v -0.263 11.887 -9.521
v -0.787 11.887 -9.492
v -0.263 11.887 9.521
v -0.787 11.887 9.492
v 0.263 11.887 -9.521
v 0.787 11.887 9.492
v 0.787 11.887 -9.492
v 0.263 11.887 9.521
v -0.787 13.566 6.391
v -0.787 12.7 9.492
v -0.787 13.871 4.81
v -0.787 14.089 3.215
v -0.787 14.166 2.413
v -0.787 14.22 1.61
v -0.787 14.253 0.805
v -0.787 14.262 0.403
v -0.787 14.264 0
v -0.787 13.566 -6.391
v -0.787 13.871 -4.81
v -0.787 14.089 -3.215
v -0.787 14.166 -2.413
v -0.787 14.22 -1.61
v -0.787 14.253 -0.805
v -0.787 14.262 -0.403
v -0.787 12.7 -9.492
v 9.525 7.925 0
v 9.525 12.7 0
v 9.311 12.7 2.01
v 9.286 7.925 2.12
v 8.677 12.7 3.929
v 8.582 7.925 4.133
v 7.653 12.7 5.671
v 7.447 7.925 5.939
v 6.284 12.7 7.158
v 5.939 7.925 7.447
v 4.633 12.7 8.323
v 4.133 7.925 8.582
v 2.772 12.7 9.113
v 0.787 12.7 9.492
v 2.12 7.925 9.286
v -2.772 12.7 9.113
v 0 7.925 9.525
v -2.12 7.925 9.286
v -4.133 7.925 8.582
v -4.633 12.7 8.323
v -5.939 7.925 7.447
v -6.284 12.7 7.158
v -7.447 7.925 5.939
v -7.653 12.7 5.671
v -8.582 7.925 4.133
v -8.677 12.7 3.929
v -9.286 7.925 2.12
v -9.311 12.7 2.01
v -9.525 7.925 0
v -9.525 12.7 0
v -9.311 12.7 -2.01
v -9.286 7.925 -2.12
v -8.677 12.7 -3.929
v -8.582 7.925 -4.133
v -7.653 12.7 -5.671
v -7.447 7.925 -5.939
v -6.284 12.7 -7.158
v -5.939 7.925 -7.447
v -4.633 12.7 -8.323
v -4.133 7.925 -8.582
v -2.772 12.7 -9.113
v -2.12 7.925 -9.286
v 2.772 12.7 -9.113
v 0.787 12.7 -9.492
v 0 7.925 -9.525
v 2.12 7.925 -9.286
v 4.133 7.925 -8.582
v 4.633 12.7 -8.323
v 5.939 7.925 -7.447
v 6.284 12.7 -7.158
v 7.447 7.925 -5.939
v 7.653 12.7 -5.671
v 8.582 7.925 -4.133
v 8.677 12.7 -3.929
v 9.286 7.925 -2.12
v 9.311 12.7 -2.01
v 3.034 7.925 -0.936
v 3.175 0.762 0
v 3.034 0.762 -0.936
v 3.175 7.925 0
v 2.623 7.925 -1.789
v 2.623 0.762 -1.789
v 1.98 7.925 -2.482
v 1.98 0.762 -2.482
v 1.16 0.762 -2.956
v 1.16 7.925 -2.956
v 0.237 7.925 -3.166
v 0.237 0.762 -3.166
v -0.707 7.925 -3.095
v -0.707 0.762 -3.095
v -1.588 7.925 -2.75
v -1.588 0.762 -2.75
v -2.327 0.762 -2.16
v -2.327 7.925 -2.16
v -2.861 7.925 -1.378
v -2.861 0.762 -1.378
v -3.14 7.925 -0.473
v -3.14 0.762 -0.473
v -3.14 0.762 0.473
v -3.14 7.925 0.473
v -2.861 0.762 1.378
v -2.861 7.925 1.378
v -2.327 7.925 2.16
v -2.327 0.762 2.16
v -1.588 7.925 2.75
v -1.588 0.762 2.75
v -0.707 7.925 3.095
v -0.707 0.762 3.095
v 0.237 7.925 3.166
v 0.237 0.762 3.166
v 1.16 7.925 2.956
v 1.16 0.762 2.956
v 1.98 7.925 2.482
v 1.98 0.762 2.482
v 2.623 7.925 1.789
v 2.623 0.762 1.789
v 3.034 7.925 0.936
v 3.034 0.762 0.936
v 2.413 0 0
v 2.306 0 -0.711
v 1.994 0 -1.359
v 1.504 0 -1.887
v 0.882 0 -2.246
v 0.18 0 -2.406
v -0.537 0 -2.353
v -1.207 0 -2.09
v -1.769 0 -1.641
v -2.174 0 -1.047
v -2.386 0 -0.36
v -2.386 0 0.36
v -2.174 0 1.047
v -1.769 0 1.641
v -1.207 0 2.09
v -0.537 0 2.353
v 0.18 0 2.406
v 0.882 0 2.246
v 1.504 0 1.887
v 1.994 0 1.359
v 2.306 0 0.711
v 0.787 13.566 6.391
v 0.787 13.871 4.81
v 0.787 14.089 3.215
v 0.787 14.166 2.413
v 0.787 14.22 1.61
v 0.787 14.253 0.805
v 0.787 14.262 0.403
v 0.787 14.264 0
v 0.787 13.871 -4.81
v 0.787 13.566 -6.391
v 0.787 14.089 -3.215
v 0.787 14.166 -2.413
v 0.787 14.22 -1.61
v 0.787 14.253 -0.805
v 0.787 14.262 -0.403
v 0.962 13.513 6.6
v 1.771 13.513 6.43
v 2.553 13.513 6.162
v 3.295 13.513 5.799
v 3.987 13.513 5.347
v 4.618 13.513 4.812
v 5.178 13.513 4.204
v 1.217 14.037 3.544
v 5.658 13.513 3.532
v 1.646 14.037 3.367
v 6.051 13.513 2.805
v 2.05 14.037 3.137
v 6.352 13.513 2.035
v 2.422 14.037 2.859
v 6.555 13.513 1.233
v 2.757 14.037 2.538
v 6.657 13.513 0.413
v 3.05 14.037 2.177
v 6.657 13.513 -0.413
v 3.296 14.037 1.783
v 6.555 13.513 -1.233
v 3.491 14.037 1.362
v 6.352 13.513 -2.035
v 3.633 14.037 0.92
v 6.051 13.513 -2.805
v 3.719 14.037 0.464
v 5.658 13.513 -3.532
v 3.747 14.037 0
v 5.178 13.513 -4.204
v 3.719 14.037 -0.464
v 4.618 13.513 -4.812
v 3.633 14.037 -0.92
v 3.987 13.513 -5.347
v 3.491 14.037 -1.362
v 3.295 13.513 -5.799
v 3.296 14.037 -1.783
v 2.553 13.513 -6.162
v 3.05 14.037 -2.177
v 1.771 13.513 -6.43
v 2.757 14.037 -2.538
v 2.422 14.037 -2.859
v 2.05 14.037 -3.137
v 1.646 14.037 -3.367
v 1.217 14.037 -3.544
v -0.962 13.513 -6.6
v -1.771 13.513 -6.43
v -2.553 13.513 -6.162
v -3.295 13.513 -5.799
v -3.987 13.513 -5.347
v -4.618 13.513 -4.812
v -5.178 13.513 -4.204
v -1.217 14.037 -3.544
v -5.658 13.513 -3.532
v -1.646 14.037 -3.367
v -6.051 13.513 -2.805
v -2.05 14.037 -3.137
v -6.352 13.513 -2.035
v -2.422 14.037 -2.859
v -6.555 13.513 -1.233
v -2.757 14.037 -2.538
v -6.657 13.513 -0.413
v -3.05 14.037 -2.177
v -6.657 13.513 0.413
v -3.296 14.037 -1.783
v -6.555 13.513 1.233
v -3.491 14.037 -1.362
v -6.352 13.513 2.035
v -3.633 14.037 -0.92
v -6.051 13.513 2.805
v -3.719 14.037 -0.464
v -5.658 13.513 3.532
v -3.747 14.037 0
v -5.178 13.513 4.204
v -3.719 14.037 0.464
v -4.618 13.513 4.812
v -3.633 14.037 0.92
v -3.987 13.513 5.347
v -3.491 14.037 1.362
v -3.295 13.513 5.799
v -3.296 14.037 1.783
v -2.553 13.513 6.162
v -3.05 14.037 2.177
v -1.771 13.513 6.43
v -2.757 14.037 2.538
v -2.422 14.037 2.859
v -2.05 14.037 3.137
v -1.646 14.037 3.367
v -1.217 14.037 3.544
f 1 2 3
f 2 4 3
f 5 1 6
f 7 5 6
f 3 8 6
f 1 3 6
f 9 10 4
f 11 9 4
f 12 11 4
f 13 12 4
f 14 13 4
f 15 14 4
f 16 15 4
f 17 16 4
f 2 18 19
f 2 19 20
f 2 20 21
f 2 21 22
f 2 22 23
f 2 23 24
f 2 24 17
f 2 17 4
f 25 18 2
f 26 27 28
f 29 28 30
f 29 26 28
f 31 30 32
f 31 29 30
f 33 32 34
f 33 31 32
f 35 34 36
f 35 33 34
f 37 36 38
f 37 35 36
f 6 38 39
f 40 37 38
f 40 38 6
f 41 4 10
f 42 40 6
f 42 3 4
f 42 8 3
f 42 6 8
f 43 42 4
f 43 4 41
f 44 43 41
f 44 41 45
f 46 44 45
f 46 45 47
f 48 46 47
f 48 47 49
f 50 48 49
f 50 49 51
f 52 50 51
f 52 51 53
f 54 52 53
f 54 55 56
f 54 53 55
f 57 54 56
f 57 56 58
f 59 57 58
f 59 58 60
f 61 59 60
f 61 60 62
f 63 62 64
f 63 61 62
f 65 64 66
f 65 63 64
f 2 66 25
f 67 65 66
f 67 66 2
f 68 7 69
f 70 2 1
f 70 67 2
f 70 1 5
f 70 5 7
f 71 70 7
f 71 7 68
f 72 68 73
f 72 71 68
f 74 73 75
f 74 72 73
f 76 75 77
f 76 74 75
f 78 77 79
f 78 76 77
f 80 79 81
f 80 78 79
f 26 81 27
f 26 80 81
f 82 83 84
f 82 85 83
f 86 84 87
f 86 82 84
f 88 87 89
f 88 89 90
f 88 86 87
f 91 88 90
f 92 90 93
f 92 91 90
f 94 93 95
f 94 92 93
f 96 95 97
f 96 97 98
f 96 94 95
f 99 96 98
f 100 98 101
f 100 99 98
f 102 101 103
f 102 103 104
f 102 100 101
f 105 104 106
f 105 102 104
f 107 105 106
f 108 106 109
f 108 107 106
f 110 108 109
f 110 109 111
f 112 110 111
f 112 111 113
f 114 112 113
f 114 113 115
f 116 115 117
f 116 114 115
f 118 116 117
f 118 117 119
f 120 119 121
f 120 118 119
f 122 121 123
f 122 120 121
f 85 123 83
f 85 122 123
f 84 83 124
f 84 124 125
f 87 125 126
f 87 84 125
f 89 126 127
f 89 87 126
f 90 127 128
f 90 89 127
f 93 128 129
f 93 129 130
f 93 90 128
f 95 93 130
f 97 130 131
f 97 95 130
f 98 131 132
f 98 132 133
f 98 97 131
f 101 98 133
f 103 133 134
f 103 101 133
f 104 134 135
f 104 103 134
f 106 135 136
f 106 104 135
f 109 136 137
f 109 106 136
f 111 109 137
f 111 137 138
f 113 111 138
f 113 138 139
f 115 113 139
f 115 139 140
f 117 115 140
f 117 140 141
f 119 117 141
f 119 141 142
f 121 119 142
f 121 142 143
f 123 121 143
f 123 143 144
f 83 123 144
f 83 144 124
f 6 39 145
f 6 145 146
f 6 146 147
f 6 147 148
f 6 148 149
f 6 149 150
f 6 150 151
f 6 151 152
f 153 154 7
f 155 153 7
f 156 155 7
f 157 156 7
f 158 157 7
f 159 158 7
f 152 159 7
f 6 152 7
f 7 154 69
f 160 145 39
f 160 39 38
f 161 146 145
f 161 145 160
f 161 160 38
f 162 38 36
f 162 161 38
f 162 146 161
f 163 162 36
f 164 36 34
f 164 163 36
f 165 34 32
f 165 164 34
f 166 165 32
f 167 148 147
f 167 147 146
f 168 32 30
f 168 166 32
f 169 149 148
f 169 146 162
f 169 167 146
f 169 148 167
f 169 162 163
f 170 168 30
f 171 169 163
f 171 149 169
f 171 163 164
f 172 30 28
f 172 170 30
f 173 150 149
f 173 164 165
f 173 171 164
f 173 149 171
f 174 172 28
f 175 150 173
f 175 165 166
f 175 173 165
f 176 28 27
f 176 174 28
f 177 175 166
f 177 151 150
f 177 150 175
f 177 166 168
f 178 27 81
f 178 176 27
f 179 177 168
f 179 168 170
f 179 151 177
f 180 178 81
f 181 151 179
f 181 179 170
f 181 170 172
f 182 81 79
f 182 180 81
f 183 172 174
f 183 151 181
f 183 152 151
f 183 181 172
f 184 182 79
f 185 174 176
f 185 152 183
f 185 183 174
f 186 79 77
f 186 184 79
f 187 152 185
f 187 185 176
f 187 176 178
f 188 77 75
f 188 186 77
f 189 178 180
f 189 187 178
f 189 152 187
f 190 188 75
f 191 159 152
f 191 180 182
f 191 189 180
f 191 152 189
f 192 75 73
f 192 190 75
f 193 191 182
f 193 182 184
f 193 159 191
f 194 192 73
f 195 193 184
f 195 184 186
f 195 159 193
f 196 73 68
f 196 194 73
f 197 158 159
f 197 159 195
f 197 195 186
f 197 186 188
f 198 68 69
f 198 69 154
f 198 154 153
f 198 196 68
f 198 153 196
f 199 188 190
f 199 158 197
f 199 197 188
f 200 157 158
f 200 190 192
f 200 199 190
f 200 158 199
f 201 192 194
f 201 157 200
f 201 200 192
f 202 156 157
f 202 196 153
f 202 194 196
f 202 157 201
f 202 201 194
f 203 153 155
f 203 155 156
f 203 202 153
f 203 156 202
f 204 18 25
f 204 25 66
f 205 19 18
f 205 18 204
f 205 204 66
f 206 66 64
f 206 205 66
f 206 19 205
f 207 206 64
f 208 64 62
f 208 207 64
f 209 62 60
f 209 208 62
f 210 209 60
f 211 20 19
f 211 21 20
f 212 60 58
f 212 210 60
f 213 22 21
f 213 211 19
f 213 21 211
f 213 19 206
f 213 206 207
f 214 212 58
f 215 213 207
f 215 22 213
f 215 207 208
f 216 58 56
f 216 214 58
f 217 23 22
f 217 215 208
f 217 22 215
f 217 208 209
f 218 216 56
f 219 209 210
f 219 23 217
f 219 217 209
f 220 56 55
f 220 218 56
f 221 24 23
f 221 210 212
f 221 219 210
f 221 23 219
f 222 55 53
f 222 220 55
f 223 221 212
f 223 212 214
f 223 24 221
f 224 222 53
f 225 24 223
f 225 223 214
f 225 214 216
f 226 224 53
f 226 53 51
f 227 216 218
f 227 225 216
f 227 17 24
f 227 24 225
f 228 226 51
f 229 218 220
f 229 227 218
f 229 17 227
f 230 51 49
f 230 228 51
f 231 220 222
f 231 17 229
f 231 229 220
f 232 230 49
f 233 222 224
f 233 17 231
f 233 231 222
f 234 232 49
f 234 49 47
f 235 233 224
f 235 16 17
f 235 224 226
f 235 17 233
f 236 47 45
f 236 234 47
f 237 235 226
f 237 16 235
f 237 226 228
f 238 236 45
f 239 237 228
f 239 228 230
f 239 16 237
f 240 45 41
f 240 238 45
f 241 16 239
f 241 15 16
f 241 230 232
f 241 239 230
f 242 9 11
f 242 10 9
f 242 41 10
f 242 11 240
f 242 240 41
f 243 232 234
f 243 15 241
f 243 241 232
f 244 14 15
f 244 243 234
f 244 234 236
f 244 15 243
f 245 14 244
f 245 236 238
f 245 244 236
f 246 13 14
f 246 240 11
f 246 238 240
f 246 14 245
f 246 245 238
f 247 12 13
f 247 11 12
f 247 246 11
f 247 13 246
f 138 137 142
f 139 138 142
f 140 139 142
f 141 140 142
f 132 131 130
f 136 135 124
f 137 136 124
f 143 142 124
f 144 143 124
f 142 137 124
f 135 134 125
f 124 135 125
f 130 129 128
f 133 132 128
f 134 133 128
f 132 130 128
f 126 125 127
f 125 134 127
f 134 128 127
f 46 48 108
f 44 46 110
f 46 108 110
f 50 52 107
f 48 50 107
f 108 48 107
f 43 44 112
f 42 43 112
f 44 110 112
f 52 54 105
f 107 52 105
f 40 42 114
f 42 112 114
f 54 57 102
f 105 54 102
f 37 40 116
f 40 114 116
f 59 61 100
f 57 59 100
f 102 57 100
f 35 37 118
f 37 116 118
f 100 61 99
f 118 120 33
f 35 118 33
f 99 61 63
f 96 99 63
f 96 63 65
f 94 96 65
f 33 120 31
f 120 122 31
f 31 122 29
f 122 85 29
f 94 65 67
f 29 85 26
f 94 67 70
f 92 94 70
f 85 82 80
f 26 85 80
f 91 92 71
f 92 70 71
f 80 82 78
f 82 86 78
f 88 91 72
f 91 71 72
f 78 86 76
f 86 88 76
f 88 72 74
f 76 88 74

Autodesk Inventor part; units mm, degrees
ref_plane "YZ Plane" through (0, 0, 0) normal (1, 0, 0) x (0, 1, 0)
ref_plane "XZ Plane" through (0, 0, 0) normal (0, 1, 0) x (-1, 0, 0)
sketch "Sketch1" plane through (0, 0, 0) normal (0, 0, 1) x (1, 0, 0)
  line L0 (0, 0) -> (19.05, 0)
  line L1 (-9.525, 7.9248) -> (9.525, 7.9248)
  line L2 (-9.525, 7.9248) -> (-9.525, 12.7)
  line L3 (-9.525, 12.7) -> (9.525, 12.7)
  line L4 (9.525, 12.7) -> (9.525, 7.9248)
  line L5 (0, 12.7) -> (0, 14.2748)
  arc A0 (9.525, 12.7) -> (-9.525, 12.7) centre (0, -15.318) ccw
  line L6 (0, 7.9248) -> (0, 0)
  line L7 (3.175, 0) -> (3.175, 7.9248)
  line L8 (3.175, 0) -> (-3.175, 0)
  line L9 (-3.175, 0) -> (-3.175, 7.9248)
  line L10 (-15.24, 0) -> (24.765, 0) projected
  line L11 (0, -21.2366) -> (0, 20.1934) projected
  dimension "d1" = 19.05
  dimension "d2" = 4.7752
  dimension "d4" = 1.5748
  dimension "d6" = 3.175
  dimension "d7" = 6.35
  dimension "d19" = 14.2748
revolve "Revolution1" add sketch "Sketch1" angle 360 about axis through (0, -10, 0) along (0, 1, 0) picked at (5.3129, 12.9905) contours L6 L1 L7 L0 | L11 L3 L4 L1 | L5 A0 L3
ref_plane "Work Plane1" through (0, 14.2748, 0) normal (0, -1, 0) x (1, 0, 0)
sketch "Sketch2" plane through (0, 14.2748, 0) normal (0, -1, 0) x (1, 0, 0)
  circle A0 centre (0, 0) radius 9.525 projected
  line L0 (0.7874, 9.4924) -> (0.7874, -9.4924)
  line L1 (-0.7874, 9.4924) -> (-0.7874, -9.4924)
  line L2 (0, -13.335) -> (0, 13.335) projected
  line L3 (-13.335, 0) -> (13.335, 0) projected
  point P0 (0, 9.525)
  dimension "d11" = 1.5748
extrude "Extrusion1" cut sketch "Sketch2" along normal blind 2.3876 contours L0 L3 L2 A0 | A0 L2 L3 L0 | L2 L3 L1 A0 | A0 L1 L3 L2
chamfer "Chamfer1" distance 0.762 angle 45 1 edges at (-3.175, 0, 0)
thread "Thread1" size "1/4-20 UNC" class "2A" standard "ANSI Unified Screw Threads" full length
properties part number "Ch7(5) Part 12 Screw NEED TO DO"
